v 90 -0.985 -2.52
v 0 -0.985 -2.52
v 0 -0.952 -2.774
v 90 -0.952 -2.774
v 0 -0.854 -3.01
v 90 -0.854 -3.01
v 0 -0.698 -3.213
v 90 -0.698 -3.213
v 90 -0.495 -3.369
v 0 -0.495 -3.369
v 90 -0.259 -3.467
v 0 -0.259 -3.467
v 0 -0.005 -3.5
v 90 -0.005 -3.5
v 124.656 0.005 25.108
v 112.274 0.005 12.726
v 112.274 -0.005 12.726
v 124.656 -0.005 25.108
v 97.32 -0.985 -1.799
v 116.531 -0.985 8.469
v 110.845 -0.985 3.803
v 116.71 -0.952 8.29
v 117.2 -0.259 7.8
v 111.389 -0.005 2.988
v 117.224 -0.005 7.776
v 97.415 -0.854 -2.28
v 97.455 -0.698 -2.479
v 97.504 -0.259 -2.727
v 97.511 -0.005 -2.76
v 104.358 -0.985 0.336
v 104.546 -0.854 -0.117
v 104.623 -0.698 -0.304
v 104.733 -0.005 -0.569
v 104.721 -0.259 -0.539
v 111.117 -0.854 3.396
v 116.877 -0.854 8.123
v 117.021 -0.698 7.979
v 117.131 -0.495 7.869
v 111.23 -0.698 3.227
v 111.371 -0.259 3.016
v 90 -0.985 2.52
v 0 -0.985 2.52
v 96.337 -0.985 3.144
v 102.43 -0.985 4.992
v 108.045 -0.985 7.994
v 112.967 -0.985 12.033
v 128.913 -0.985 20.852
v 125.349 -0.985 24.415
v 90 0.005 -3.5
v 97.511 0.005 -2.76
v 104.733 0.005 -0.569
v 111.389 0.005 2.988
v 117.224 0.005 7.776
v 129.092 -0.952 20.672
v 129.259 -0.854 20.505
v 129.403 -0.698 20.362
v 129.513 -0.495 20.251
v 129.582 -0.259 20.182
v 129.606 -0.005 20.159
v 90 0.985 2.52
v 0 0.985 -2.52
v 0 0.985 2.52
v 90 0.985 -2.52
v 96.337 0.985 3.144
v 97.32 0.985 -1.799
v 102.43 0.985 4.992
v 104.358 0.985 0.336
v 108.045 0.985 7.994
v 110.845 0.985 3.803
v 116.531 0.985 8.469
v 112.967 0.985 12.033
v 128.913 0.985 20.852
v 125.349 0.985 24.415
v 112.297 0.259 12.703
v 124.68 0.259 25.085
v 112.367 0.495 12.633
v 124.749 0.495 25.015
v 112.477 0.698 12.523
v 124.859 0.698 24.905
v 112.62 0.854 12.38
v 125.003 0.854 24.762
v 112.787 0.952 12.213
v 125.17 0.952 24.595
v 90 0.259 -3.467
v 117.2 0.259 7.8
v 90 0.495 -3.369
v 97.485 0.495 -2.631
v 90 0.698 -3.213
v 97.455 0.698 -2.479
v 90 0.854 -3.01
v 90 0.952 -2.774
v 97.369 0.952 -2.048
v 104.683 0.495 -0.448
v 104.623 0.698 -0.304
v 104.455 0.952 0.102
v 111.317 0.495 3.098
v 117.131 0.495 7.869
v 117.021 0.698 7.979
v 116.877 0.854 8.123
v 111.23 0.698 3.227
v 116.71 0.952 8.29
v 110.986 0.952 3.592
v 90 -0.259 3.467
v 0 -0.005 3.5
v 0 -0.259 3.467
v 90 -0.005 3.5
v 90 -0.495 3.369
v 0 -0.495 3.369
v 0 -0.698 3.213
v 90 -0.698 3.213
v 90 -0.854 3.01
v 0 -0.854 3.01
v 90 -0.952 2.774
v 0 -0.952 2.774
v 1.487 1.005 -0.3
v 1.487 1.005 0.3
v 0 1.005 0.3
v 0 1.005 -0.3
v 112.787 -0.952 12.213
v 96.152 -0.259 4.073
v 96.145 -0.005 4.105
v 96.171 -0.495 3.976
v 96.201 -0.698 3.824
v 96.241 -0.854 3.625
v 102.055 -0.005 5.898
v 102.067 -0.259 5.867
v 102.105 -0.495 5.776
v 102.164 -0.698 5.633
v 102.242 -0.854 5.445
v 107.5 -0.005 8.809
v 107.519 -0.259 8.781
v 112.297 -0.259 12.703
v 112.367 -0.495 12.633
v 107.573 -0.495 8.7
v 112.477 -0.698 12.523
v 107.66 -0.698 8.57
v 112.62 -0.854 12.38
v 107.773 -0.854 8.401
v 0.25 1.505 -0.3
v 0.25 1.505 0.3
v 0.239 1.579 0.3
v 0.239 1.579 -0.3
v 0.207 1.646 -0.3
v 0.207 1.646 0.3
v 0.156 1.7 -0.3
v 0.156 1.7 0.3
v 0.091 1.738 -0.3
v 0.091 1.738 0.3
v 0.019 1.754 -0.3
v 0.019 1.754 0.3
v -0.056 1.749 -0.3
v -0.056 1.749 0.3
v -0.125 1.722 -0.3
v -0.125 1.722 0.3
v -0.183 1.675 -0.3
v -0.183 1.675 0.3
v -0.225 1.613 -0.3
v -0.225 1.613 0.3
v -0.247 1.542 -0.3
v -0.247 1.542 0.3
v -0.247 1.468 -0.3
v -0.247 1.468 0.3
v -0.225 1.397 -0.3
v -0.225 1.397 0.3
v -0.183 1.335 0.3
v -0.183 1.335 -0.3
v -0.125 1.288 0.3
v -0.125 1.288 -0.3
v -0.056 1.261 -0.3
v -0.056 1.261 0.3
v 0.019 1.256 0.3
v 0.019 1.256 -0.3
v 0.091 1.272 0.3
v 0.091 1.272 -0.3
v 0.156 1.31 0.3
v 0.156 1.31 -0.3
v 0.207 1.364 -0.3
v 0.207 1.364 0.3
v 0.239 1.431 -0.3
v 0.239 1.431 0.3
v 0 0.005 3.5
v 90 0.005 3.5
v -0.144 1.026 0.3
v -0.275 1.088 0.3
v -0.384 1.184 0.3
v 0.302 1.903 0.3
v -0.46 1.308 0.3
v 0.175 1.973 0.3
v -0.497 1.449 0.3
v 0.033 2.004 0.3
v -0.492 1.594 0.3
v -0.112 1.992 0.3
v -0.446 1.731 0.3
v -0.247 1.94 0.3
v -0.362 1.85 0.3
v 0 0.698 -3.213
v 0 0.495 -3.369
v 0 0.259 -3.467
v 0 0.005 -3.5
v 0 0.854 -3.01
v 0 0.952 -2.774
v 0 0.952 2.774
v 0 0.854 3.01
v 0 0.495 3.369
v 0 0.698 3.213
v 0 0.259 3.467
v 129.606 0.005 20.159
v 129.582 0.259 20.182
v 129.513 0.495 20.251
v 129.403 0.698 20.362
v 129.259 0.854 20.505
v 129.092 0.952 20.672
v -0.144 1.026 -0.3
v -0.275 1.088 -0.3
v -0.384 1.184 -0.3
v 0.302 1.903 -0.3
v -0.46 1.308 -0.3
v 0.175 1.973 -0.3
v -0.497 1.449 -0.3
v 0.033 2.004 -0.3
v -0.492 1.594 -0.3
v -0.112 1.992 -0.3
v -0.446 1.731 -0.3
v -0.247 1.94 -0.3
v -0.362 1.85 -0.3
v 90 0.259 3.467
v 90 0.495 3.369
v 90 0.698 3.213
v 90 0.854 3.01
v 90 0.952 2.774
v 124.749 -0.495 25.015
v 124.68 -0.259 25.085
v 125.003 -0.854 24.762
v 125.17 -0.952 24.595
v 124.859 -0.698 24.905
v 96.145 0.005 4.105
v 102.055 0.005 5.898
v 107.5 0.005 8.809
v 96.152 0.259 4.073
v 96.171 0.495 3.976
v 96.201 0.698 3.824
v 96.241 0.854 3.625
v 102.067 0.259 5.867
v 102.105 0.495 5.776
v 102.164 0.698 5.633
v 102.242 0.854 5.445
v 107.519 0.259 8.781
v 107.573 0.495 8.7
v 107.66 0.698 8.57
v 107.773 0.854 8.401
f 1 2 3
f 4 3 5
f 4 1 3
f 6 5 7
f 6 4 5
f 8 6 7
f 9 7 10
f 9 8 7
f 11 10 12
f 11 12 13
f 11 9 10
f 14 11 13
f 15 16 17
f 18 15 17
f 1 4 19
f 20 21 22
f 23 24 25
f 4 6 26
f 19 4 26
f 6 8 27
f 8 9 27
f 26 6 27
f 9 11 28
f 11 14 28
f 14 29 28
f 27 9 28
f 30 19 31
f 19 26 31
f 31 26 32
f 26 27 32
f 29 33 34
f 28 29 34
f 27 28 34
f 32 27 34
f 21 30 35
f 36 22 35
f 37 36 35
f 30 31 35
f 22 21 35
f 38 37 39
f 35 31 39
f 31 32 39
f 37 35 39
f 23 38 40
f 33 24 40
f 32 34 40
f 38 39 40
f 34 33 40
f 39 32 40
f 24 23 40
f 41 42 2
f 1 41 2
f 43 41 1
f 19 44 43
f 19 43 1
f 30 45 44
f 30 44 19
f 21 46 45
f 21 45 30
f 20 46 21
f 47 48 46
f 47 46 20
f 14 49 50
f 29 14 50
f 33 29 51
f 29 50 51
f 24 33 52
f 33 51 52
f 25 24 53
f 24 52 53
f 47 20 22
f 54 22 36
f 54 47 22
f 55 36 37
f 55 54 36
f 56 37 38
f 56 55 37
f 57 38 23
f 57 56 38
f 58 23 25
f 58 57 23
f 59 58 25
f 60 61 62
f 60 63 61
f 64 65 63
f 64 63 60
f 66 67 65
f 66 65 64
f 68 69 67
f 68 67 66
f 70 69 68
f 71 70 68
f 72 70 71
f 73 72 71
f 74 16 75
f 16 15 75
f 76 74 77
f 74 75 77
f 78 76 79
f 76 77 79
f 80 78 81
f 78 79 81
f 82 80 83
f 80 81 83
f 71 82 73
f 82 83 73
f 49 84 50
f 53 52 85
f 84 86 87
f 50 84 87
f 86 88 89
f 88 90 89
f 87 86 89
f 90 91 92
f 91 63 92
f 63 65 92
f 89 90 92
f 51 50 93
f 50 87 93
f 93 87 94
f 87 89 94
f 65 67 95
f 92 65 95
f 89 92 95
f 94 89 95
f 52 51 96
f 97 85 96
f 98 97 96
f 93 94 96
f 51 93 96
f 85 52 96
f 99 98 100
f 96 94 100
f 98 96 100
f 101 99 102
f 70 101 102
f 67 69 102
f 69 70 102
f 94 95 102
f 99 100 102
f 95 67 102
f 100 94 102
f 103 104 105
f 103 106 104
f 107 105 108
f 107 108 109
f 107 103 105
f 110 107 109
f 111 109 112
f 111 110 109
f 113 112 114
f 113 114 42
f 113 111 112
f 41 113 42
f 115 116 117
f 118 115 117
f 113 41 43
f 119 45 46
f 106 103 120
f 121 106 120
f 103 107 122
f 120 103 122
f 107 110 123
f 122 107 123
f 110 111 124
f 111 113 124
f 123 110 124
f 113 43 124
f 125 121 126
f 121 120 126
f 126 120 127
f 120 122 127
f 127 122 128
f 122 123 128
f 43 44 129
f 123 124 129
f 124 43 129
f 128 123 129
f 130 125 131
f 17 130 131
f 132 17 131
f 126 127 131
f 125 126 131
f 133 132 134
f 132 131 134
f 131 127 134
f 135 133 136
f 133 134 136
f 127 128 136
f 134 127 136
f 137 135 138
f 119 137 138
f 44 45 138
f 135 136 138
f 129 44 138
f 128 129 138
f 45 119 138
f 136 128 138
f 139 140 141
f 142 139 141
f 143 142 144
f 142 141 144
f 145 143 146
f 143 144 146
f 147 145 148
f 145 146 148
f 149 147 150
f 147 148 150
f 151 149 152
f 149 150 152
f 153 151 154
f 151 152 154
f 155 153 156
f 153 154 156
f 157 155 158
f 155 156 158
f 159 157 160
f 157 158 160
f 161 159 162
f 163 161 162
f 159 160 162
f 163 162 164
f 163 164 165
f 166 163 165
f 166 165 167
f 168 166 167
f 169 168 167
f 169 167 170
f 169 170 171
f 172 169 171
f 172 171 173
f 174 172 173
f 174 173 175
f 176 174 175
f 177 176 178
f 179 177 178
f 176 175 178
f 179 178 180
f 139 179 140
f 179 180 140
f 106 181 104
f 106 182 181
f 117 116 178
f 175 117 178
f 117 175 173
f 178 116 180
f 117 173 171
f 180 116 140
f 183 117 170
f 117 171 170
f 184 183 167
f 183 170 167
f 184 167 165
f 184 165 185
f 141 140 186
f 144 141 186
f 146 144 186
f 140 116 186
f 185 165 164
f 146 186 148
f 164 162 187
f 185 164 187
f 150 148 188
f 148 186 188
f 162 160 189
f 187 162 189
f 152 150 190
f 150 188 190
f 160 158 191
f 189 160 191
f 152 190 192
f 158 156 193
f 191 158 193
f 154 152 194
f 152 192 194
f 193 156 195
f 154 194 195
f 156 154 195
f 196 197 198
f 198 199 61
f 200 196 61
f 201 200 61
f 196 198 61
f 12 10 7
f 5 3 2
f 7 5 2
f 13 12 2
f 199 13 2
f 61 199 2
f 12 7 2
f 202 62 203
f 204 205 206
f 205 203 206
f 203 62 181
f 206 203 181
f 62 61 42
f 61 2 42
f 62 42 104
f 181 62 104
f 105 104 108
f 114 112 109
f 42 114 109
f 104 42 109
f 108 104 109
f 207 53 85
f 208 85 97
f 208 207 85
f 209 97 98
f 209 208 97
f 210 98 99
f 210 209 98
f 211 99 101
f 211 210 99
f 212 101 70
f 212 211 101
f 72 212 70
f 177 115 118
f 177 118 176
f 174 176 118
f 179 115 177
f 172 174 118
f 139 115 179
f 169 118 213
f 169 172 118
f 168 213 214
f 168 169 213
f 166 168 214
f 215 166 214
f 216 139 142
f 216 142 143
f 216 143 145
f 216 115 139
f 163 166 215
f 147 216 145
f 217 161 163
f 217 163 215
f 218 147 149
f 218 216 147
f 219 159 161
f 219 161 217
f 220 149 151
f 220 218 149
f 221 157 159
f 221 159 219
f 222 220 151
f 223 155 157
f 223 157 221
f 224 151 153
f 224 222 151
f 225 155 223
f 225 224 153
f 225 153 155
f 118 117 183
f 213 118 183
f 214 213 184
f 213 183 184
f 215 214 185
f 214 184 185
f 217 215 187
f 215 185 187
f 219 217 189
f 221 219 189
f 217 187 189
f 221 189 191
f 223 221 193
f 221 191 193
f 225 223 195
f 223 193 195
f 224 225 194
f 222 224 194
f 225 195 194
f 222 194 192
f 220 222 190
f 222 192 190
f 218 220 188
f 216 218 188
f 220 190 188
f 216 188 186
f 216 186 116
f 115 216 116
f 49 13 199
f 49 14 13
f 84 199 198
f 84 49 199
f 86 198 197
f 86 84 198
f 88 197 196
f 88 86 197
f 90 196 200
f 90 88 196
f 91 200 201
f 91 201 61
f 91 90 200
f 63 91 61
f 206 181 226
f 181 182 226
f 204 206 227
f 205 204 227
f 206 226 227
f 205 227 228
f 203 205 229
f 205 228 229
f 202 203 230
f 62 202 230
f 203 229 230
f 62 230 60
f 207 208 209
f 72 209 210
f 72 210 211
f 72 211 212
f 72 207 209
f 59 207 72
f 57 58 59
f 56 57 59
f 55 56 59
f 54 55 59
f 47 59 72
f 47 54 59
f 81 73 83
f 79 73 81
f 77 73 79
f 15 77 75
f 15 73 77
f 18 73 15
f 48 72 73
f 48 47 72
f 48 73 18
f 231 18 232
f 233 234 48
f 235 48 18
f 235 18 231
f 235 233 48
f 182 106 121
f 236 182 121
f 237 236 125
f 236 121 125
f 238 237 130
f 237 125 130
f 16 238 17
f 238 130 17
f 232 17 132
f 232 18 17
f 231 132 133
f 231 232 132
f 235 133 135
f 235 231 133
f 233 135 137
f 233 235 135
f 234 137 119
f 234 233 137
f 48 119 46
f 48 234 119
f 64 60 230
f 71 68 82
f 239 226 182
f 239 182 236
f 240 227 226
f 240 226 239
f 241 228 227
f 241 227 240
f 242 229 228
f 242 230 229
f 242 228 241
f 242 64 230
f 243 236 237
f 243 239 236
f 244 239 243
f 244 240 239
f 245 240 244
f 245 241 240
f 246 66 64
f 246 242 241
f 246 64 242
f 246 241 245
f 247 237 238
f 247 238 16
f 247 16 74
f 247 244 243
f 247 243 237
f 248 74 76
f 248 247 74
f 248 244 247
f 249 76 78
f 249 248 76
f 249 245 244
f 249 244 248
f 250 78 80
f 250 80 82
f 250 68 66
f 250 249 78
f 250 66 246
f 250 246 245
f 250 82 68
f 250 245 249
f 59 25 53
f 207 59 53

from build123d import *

# Parameters (mm, degrees)
SKETCH3_W           = 7
SKETCH3_H           = 1.97
FILLET1_R           = 0.98
SKETCH7_R           = 0.25
BOSS_EXTRUDE1_DEPTH = 0.6


with BuildPart() as part:
    # Sweep1: sweep along a path in Sketch1
    with BuildLine(Plane(origin=(0, 0, 0), x_dir=(1, 0, 0), z_dir=(0, 1, 0))) as sweep1_path:
        Line((0, 0), (90, 0))
        ThreePointArc((90, 0), (103.393920133, -2.664216362), (114.748737342, -10.251262658))
        Line((114.748737342, -10.251262658), (127.13092964, -22.633454957))
    # Sketch3 → Sweep1 (sweep)
    with BuildSketch(Plane(origin=(0, 0, 0), x_dir=(0, 0, -1), z_dir=(1, 0, 0))):
        Rectangle(SKETCH3_W, SKETCH3_H)
    sweep(path=sweep1_path.line)

    # Fillet1
    fillet1_edges = [part.edges().sort_by_distance(p)[0] for p in [
        (45, -0.985, -3.5),
        (45, 0.985, -3.5),
        (45, 0.985, 3.5),
        (45, -0.985, 3.5),
        (104.733312146, -0.985, -0.569362002),
        (104.733312146, 0.985, -0.569362002),
        (102.05452812, 0.985, 5.897794726),
        (102.05452812, -0.985, 5.897794726),
        (123.414707225, -0.985, 13.967485074),
        (123.414707225, 0.985, 13.967485074),
        (118.464959757, 0.985, 18.917232542),
        (118.464959757, -0.985, 18.917232542),
    ]]
    fillet(fillet1_edges, radius=FILLET1_R)


with BuildPart() as body_2:
    # Sketch7 → Boss-Extrude1 (new body)
    with BuildSketch(Plane.XY.offset(0.3)):
        with BuildLine():
            Line((1.487306111, 1.005), (0, 1.005))
            ThreePointArc((0, 1.005), (-0.473935601, 1.664326852), (0.30204267, 1.903459817))
            Line((0.30204267, 1.903459817), (1.487306111, 1.005))
        make_face()
        with Locations((0, 1.505)):
            Circle(SKETCH7_R, mode=Mode.SUBTRACT)
    extrude(amount=-BOSS_EXTRUDE1_DEPTH)


solid = Compound([part.part, body_2.part])
